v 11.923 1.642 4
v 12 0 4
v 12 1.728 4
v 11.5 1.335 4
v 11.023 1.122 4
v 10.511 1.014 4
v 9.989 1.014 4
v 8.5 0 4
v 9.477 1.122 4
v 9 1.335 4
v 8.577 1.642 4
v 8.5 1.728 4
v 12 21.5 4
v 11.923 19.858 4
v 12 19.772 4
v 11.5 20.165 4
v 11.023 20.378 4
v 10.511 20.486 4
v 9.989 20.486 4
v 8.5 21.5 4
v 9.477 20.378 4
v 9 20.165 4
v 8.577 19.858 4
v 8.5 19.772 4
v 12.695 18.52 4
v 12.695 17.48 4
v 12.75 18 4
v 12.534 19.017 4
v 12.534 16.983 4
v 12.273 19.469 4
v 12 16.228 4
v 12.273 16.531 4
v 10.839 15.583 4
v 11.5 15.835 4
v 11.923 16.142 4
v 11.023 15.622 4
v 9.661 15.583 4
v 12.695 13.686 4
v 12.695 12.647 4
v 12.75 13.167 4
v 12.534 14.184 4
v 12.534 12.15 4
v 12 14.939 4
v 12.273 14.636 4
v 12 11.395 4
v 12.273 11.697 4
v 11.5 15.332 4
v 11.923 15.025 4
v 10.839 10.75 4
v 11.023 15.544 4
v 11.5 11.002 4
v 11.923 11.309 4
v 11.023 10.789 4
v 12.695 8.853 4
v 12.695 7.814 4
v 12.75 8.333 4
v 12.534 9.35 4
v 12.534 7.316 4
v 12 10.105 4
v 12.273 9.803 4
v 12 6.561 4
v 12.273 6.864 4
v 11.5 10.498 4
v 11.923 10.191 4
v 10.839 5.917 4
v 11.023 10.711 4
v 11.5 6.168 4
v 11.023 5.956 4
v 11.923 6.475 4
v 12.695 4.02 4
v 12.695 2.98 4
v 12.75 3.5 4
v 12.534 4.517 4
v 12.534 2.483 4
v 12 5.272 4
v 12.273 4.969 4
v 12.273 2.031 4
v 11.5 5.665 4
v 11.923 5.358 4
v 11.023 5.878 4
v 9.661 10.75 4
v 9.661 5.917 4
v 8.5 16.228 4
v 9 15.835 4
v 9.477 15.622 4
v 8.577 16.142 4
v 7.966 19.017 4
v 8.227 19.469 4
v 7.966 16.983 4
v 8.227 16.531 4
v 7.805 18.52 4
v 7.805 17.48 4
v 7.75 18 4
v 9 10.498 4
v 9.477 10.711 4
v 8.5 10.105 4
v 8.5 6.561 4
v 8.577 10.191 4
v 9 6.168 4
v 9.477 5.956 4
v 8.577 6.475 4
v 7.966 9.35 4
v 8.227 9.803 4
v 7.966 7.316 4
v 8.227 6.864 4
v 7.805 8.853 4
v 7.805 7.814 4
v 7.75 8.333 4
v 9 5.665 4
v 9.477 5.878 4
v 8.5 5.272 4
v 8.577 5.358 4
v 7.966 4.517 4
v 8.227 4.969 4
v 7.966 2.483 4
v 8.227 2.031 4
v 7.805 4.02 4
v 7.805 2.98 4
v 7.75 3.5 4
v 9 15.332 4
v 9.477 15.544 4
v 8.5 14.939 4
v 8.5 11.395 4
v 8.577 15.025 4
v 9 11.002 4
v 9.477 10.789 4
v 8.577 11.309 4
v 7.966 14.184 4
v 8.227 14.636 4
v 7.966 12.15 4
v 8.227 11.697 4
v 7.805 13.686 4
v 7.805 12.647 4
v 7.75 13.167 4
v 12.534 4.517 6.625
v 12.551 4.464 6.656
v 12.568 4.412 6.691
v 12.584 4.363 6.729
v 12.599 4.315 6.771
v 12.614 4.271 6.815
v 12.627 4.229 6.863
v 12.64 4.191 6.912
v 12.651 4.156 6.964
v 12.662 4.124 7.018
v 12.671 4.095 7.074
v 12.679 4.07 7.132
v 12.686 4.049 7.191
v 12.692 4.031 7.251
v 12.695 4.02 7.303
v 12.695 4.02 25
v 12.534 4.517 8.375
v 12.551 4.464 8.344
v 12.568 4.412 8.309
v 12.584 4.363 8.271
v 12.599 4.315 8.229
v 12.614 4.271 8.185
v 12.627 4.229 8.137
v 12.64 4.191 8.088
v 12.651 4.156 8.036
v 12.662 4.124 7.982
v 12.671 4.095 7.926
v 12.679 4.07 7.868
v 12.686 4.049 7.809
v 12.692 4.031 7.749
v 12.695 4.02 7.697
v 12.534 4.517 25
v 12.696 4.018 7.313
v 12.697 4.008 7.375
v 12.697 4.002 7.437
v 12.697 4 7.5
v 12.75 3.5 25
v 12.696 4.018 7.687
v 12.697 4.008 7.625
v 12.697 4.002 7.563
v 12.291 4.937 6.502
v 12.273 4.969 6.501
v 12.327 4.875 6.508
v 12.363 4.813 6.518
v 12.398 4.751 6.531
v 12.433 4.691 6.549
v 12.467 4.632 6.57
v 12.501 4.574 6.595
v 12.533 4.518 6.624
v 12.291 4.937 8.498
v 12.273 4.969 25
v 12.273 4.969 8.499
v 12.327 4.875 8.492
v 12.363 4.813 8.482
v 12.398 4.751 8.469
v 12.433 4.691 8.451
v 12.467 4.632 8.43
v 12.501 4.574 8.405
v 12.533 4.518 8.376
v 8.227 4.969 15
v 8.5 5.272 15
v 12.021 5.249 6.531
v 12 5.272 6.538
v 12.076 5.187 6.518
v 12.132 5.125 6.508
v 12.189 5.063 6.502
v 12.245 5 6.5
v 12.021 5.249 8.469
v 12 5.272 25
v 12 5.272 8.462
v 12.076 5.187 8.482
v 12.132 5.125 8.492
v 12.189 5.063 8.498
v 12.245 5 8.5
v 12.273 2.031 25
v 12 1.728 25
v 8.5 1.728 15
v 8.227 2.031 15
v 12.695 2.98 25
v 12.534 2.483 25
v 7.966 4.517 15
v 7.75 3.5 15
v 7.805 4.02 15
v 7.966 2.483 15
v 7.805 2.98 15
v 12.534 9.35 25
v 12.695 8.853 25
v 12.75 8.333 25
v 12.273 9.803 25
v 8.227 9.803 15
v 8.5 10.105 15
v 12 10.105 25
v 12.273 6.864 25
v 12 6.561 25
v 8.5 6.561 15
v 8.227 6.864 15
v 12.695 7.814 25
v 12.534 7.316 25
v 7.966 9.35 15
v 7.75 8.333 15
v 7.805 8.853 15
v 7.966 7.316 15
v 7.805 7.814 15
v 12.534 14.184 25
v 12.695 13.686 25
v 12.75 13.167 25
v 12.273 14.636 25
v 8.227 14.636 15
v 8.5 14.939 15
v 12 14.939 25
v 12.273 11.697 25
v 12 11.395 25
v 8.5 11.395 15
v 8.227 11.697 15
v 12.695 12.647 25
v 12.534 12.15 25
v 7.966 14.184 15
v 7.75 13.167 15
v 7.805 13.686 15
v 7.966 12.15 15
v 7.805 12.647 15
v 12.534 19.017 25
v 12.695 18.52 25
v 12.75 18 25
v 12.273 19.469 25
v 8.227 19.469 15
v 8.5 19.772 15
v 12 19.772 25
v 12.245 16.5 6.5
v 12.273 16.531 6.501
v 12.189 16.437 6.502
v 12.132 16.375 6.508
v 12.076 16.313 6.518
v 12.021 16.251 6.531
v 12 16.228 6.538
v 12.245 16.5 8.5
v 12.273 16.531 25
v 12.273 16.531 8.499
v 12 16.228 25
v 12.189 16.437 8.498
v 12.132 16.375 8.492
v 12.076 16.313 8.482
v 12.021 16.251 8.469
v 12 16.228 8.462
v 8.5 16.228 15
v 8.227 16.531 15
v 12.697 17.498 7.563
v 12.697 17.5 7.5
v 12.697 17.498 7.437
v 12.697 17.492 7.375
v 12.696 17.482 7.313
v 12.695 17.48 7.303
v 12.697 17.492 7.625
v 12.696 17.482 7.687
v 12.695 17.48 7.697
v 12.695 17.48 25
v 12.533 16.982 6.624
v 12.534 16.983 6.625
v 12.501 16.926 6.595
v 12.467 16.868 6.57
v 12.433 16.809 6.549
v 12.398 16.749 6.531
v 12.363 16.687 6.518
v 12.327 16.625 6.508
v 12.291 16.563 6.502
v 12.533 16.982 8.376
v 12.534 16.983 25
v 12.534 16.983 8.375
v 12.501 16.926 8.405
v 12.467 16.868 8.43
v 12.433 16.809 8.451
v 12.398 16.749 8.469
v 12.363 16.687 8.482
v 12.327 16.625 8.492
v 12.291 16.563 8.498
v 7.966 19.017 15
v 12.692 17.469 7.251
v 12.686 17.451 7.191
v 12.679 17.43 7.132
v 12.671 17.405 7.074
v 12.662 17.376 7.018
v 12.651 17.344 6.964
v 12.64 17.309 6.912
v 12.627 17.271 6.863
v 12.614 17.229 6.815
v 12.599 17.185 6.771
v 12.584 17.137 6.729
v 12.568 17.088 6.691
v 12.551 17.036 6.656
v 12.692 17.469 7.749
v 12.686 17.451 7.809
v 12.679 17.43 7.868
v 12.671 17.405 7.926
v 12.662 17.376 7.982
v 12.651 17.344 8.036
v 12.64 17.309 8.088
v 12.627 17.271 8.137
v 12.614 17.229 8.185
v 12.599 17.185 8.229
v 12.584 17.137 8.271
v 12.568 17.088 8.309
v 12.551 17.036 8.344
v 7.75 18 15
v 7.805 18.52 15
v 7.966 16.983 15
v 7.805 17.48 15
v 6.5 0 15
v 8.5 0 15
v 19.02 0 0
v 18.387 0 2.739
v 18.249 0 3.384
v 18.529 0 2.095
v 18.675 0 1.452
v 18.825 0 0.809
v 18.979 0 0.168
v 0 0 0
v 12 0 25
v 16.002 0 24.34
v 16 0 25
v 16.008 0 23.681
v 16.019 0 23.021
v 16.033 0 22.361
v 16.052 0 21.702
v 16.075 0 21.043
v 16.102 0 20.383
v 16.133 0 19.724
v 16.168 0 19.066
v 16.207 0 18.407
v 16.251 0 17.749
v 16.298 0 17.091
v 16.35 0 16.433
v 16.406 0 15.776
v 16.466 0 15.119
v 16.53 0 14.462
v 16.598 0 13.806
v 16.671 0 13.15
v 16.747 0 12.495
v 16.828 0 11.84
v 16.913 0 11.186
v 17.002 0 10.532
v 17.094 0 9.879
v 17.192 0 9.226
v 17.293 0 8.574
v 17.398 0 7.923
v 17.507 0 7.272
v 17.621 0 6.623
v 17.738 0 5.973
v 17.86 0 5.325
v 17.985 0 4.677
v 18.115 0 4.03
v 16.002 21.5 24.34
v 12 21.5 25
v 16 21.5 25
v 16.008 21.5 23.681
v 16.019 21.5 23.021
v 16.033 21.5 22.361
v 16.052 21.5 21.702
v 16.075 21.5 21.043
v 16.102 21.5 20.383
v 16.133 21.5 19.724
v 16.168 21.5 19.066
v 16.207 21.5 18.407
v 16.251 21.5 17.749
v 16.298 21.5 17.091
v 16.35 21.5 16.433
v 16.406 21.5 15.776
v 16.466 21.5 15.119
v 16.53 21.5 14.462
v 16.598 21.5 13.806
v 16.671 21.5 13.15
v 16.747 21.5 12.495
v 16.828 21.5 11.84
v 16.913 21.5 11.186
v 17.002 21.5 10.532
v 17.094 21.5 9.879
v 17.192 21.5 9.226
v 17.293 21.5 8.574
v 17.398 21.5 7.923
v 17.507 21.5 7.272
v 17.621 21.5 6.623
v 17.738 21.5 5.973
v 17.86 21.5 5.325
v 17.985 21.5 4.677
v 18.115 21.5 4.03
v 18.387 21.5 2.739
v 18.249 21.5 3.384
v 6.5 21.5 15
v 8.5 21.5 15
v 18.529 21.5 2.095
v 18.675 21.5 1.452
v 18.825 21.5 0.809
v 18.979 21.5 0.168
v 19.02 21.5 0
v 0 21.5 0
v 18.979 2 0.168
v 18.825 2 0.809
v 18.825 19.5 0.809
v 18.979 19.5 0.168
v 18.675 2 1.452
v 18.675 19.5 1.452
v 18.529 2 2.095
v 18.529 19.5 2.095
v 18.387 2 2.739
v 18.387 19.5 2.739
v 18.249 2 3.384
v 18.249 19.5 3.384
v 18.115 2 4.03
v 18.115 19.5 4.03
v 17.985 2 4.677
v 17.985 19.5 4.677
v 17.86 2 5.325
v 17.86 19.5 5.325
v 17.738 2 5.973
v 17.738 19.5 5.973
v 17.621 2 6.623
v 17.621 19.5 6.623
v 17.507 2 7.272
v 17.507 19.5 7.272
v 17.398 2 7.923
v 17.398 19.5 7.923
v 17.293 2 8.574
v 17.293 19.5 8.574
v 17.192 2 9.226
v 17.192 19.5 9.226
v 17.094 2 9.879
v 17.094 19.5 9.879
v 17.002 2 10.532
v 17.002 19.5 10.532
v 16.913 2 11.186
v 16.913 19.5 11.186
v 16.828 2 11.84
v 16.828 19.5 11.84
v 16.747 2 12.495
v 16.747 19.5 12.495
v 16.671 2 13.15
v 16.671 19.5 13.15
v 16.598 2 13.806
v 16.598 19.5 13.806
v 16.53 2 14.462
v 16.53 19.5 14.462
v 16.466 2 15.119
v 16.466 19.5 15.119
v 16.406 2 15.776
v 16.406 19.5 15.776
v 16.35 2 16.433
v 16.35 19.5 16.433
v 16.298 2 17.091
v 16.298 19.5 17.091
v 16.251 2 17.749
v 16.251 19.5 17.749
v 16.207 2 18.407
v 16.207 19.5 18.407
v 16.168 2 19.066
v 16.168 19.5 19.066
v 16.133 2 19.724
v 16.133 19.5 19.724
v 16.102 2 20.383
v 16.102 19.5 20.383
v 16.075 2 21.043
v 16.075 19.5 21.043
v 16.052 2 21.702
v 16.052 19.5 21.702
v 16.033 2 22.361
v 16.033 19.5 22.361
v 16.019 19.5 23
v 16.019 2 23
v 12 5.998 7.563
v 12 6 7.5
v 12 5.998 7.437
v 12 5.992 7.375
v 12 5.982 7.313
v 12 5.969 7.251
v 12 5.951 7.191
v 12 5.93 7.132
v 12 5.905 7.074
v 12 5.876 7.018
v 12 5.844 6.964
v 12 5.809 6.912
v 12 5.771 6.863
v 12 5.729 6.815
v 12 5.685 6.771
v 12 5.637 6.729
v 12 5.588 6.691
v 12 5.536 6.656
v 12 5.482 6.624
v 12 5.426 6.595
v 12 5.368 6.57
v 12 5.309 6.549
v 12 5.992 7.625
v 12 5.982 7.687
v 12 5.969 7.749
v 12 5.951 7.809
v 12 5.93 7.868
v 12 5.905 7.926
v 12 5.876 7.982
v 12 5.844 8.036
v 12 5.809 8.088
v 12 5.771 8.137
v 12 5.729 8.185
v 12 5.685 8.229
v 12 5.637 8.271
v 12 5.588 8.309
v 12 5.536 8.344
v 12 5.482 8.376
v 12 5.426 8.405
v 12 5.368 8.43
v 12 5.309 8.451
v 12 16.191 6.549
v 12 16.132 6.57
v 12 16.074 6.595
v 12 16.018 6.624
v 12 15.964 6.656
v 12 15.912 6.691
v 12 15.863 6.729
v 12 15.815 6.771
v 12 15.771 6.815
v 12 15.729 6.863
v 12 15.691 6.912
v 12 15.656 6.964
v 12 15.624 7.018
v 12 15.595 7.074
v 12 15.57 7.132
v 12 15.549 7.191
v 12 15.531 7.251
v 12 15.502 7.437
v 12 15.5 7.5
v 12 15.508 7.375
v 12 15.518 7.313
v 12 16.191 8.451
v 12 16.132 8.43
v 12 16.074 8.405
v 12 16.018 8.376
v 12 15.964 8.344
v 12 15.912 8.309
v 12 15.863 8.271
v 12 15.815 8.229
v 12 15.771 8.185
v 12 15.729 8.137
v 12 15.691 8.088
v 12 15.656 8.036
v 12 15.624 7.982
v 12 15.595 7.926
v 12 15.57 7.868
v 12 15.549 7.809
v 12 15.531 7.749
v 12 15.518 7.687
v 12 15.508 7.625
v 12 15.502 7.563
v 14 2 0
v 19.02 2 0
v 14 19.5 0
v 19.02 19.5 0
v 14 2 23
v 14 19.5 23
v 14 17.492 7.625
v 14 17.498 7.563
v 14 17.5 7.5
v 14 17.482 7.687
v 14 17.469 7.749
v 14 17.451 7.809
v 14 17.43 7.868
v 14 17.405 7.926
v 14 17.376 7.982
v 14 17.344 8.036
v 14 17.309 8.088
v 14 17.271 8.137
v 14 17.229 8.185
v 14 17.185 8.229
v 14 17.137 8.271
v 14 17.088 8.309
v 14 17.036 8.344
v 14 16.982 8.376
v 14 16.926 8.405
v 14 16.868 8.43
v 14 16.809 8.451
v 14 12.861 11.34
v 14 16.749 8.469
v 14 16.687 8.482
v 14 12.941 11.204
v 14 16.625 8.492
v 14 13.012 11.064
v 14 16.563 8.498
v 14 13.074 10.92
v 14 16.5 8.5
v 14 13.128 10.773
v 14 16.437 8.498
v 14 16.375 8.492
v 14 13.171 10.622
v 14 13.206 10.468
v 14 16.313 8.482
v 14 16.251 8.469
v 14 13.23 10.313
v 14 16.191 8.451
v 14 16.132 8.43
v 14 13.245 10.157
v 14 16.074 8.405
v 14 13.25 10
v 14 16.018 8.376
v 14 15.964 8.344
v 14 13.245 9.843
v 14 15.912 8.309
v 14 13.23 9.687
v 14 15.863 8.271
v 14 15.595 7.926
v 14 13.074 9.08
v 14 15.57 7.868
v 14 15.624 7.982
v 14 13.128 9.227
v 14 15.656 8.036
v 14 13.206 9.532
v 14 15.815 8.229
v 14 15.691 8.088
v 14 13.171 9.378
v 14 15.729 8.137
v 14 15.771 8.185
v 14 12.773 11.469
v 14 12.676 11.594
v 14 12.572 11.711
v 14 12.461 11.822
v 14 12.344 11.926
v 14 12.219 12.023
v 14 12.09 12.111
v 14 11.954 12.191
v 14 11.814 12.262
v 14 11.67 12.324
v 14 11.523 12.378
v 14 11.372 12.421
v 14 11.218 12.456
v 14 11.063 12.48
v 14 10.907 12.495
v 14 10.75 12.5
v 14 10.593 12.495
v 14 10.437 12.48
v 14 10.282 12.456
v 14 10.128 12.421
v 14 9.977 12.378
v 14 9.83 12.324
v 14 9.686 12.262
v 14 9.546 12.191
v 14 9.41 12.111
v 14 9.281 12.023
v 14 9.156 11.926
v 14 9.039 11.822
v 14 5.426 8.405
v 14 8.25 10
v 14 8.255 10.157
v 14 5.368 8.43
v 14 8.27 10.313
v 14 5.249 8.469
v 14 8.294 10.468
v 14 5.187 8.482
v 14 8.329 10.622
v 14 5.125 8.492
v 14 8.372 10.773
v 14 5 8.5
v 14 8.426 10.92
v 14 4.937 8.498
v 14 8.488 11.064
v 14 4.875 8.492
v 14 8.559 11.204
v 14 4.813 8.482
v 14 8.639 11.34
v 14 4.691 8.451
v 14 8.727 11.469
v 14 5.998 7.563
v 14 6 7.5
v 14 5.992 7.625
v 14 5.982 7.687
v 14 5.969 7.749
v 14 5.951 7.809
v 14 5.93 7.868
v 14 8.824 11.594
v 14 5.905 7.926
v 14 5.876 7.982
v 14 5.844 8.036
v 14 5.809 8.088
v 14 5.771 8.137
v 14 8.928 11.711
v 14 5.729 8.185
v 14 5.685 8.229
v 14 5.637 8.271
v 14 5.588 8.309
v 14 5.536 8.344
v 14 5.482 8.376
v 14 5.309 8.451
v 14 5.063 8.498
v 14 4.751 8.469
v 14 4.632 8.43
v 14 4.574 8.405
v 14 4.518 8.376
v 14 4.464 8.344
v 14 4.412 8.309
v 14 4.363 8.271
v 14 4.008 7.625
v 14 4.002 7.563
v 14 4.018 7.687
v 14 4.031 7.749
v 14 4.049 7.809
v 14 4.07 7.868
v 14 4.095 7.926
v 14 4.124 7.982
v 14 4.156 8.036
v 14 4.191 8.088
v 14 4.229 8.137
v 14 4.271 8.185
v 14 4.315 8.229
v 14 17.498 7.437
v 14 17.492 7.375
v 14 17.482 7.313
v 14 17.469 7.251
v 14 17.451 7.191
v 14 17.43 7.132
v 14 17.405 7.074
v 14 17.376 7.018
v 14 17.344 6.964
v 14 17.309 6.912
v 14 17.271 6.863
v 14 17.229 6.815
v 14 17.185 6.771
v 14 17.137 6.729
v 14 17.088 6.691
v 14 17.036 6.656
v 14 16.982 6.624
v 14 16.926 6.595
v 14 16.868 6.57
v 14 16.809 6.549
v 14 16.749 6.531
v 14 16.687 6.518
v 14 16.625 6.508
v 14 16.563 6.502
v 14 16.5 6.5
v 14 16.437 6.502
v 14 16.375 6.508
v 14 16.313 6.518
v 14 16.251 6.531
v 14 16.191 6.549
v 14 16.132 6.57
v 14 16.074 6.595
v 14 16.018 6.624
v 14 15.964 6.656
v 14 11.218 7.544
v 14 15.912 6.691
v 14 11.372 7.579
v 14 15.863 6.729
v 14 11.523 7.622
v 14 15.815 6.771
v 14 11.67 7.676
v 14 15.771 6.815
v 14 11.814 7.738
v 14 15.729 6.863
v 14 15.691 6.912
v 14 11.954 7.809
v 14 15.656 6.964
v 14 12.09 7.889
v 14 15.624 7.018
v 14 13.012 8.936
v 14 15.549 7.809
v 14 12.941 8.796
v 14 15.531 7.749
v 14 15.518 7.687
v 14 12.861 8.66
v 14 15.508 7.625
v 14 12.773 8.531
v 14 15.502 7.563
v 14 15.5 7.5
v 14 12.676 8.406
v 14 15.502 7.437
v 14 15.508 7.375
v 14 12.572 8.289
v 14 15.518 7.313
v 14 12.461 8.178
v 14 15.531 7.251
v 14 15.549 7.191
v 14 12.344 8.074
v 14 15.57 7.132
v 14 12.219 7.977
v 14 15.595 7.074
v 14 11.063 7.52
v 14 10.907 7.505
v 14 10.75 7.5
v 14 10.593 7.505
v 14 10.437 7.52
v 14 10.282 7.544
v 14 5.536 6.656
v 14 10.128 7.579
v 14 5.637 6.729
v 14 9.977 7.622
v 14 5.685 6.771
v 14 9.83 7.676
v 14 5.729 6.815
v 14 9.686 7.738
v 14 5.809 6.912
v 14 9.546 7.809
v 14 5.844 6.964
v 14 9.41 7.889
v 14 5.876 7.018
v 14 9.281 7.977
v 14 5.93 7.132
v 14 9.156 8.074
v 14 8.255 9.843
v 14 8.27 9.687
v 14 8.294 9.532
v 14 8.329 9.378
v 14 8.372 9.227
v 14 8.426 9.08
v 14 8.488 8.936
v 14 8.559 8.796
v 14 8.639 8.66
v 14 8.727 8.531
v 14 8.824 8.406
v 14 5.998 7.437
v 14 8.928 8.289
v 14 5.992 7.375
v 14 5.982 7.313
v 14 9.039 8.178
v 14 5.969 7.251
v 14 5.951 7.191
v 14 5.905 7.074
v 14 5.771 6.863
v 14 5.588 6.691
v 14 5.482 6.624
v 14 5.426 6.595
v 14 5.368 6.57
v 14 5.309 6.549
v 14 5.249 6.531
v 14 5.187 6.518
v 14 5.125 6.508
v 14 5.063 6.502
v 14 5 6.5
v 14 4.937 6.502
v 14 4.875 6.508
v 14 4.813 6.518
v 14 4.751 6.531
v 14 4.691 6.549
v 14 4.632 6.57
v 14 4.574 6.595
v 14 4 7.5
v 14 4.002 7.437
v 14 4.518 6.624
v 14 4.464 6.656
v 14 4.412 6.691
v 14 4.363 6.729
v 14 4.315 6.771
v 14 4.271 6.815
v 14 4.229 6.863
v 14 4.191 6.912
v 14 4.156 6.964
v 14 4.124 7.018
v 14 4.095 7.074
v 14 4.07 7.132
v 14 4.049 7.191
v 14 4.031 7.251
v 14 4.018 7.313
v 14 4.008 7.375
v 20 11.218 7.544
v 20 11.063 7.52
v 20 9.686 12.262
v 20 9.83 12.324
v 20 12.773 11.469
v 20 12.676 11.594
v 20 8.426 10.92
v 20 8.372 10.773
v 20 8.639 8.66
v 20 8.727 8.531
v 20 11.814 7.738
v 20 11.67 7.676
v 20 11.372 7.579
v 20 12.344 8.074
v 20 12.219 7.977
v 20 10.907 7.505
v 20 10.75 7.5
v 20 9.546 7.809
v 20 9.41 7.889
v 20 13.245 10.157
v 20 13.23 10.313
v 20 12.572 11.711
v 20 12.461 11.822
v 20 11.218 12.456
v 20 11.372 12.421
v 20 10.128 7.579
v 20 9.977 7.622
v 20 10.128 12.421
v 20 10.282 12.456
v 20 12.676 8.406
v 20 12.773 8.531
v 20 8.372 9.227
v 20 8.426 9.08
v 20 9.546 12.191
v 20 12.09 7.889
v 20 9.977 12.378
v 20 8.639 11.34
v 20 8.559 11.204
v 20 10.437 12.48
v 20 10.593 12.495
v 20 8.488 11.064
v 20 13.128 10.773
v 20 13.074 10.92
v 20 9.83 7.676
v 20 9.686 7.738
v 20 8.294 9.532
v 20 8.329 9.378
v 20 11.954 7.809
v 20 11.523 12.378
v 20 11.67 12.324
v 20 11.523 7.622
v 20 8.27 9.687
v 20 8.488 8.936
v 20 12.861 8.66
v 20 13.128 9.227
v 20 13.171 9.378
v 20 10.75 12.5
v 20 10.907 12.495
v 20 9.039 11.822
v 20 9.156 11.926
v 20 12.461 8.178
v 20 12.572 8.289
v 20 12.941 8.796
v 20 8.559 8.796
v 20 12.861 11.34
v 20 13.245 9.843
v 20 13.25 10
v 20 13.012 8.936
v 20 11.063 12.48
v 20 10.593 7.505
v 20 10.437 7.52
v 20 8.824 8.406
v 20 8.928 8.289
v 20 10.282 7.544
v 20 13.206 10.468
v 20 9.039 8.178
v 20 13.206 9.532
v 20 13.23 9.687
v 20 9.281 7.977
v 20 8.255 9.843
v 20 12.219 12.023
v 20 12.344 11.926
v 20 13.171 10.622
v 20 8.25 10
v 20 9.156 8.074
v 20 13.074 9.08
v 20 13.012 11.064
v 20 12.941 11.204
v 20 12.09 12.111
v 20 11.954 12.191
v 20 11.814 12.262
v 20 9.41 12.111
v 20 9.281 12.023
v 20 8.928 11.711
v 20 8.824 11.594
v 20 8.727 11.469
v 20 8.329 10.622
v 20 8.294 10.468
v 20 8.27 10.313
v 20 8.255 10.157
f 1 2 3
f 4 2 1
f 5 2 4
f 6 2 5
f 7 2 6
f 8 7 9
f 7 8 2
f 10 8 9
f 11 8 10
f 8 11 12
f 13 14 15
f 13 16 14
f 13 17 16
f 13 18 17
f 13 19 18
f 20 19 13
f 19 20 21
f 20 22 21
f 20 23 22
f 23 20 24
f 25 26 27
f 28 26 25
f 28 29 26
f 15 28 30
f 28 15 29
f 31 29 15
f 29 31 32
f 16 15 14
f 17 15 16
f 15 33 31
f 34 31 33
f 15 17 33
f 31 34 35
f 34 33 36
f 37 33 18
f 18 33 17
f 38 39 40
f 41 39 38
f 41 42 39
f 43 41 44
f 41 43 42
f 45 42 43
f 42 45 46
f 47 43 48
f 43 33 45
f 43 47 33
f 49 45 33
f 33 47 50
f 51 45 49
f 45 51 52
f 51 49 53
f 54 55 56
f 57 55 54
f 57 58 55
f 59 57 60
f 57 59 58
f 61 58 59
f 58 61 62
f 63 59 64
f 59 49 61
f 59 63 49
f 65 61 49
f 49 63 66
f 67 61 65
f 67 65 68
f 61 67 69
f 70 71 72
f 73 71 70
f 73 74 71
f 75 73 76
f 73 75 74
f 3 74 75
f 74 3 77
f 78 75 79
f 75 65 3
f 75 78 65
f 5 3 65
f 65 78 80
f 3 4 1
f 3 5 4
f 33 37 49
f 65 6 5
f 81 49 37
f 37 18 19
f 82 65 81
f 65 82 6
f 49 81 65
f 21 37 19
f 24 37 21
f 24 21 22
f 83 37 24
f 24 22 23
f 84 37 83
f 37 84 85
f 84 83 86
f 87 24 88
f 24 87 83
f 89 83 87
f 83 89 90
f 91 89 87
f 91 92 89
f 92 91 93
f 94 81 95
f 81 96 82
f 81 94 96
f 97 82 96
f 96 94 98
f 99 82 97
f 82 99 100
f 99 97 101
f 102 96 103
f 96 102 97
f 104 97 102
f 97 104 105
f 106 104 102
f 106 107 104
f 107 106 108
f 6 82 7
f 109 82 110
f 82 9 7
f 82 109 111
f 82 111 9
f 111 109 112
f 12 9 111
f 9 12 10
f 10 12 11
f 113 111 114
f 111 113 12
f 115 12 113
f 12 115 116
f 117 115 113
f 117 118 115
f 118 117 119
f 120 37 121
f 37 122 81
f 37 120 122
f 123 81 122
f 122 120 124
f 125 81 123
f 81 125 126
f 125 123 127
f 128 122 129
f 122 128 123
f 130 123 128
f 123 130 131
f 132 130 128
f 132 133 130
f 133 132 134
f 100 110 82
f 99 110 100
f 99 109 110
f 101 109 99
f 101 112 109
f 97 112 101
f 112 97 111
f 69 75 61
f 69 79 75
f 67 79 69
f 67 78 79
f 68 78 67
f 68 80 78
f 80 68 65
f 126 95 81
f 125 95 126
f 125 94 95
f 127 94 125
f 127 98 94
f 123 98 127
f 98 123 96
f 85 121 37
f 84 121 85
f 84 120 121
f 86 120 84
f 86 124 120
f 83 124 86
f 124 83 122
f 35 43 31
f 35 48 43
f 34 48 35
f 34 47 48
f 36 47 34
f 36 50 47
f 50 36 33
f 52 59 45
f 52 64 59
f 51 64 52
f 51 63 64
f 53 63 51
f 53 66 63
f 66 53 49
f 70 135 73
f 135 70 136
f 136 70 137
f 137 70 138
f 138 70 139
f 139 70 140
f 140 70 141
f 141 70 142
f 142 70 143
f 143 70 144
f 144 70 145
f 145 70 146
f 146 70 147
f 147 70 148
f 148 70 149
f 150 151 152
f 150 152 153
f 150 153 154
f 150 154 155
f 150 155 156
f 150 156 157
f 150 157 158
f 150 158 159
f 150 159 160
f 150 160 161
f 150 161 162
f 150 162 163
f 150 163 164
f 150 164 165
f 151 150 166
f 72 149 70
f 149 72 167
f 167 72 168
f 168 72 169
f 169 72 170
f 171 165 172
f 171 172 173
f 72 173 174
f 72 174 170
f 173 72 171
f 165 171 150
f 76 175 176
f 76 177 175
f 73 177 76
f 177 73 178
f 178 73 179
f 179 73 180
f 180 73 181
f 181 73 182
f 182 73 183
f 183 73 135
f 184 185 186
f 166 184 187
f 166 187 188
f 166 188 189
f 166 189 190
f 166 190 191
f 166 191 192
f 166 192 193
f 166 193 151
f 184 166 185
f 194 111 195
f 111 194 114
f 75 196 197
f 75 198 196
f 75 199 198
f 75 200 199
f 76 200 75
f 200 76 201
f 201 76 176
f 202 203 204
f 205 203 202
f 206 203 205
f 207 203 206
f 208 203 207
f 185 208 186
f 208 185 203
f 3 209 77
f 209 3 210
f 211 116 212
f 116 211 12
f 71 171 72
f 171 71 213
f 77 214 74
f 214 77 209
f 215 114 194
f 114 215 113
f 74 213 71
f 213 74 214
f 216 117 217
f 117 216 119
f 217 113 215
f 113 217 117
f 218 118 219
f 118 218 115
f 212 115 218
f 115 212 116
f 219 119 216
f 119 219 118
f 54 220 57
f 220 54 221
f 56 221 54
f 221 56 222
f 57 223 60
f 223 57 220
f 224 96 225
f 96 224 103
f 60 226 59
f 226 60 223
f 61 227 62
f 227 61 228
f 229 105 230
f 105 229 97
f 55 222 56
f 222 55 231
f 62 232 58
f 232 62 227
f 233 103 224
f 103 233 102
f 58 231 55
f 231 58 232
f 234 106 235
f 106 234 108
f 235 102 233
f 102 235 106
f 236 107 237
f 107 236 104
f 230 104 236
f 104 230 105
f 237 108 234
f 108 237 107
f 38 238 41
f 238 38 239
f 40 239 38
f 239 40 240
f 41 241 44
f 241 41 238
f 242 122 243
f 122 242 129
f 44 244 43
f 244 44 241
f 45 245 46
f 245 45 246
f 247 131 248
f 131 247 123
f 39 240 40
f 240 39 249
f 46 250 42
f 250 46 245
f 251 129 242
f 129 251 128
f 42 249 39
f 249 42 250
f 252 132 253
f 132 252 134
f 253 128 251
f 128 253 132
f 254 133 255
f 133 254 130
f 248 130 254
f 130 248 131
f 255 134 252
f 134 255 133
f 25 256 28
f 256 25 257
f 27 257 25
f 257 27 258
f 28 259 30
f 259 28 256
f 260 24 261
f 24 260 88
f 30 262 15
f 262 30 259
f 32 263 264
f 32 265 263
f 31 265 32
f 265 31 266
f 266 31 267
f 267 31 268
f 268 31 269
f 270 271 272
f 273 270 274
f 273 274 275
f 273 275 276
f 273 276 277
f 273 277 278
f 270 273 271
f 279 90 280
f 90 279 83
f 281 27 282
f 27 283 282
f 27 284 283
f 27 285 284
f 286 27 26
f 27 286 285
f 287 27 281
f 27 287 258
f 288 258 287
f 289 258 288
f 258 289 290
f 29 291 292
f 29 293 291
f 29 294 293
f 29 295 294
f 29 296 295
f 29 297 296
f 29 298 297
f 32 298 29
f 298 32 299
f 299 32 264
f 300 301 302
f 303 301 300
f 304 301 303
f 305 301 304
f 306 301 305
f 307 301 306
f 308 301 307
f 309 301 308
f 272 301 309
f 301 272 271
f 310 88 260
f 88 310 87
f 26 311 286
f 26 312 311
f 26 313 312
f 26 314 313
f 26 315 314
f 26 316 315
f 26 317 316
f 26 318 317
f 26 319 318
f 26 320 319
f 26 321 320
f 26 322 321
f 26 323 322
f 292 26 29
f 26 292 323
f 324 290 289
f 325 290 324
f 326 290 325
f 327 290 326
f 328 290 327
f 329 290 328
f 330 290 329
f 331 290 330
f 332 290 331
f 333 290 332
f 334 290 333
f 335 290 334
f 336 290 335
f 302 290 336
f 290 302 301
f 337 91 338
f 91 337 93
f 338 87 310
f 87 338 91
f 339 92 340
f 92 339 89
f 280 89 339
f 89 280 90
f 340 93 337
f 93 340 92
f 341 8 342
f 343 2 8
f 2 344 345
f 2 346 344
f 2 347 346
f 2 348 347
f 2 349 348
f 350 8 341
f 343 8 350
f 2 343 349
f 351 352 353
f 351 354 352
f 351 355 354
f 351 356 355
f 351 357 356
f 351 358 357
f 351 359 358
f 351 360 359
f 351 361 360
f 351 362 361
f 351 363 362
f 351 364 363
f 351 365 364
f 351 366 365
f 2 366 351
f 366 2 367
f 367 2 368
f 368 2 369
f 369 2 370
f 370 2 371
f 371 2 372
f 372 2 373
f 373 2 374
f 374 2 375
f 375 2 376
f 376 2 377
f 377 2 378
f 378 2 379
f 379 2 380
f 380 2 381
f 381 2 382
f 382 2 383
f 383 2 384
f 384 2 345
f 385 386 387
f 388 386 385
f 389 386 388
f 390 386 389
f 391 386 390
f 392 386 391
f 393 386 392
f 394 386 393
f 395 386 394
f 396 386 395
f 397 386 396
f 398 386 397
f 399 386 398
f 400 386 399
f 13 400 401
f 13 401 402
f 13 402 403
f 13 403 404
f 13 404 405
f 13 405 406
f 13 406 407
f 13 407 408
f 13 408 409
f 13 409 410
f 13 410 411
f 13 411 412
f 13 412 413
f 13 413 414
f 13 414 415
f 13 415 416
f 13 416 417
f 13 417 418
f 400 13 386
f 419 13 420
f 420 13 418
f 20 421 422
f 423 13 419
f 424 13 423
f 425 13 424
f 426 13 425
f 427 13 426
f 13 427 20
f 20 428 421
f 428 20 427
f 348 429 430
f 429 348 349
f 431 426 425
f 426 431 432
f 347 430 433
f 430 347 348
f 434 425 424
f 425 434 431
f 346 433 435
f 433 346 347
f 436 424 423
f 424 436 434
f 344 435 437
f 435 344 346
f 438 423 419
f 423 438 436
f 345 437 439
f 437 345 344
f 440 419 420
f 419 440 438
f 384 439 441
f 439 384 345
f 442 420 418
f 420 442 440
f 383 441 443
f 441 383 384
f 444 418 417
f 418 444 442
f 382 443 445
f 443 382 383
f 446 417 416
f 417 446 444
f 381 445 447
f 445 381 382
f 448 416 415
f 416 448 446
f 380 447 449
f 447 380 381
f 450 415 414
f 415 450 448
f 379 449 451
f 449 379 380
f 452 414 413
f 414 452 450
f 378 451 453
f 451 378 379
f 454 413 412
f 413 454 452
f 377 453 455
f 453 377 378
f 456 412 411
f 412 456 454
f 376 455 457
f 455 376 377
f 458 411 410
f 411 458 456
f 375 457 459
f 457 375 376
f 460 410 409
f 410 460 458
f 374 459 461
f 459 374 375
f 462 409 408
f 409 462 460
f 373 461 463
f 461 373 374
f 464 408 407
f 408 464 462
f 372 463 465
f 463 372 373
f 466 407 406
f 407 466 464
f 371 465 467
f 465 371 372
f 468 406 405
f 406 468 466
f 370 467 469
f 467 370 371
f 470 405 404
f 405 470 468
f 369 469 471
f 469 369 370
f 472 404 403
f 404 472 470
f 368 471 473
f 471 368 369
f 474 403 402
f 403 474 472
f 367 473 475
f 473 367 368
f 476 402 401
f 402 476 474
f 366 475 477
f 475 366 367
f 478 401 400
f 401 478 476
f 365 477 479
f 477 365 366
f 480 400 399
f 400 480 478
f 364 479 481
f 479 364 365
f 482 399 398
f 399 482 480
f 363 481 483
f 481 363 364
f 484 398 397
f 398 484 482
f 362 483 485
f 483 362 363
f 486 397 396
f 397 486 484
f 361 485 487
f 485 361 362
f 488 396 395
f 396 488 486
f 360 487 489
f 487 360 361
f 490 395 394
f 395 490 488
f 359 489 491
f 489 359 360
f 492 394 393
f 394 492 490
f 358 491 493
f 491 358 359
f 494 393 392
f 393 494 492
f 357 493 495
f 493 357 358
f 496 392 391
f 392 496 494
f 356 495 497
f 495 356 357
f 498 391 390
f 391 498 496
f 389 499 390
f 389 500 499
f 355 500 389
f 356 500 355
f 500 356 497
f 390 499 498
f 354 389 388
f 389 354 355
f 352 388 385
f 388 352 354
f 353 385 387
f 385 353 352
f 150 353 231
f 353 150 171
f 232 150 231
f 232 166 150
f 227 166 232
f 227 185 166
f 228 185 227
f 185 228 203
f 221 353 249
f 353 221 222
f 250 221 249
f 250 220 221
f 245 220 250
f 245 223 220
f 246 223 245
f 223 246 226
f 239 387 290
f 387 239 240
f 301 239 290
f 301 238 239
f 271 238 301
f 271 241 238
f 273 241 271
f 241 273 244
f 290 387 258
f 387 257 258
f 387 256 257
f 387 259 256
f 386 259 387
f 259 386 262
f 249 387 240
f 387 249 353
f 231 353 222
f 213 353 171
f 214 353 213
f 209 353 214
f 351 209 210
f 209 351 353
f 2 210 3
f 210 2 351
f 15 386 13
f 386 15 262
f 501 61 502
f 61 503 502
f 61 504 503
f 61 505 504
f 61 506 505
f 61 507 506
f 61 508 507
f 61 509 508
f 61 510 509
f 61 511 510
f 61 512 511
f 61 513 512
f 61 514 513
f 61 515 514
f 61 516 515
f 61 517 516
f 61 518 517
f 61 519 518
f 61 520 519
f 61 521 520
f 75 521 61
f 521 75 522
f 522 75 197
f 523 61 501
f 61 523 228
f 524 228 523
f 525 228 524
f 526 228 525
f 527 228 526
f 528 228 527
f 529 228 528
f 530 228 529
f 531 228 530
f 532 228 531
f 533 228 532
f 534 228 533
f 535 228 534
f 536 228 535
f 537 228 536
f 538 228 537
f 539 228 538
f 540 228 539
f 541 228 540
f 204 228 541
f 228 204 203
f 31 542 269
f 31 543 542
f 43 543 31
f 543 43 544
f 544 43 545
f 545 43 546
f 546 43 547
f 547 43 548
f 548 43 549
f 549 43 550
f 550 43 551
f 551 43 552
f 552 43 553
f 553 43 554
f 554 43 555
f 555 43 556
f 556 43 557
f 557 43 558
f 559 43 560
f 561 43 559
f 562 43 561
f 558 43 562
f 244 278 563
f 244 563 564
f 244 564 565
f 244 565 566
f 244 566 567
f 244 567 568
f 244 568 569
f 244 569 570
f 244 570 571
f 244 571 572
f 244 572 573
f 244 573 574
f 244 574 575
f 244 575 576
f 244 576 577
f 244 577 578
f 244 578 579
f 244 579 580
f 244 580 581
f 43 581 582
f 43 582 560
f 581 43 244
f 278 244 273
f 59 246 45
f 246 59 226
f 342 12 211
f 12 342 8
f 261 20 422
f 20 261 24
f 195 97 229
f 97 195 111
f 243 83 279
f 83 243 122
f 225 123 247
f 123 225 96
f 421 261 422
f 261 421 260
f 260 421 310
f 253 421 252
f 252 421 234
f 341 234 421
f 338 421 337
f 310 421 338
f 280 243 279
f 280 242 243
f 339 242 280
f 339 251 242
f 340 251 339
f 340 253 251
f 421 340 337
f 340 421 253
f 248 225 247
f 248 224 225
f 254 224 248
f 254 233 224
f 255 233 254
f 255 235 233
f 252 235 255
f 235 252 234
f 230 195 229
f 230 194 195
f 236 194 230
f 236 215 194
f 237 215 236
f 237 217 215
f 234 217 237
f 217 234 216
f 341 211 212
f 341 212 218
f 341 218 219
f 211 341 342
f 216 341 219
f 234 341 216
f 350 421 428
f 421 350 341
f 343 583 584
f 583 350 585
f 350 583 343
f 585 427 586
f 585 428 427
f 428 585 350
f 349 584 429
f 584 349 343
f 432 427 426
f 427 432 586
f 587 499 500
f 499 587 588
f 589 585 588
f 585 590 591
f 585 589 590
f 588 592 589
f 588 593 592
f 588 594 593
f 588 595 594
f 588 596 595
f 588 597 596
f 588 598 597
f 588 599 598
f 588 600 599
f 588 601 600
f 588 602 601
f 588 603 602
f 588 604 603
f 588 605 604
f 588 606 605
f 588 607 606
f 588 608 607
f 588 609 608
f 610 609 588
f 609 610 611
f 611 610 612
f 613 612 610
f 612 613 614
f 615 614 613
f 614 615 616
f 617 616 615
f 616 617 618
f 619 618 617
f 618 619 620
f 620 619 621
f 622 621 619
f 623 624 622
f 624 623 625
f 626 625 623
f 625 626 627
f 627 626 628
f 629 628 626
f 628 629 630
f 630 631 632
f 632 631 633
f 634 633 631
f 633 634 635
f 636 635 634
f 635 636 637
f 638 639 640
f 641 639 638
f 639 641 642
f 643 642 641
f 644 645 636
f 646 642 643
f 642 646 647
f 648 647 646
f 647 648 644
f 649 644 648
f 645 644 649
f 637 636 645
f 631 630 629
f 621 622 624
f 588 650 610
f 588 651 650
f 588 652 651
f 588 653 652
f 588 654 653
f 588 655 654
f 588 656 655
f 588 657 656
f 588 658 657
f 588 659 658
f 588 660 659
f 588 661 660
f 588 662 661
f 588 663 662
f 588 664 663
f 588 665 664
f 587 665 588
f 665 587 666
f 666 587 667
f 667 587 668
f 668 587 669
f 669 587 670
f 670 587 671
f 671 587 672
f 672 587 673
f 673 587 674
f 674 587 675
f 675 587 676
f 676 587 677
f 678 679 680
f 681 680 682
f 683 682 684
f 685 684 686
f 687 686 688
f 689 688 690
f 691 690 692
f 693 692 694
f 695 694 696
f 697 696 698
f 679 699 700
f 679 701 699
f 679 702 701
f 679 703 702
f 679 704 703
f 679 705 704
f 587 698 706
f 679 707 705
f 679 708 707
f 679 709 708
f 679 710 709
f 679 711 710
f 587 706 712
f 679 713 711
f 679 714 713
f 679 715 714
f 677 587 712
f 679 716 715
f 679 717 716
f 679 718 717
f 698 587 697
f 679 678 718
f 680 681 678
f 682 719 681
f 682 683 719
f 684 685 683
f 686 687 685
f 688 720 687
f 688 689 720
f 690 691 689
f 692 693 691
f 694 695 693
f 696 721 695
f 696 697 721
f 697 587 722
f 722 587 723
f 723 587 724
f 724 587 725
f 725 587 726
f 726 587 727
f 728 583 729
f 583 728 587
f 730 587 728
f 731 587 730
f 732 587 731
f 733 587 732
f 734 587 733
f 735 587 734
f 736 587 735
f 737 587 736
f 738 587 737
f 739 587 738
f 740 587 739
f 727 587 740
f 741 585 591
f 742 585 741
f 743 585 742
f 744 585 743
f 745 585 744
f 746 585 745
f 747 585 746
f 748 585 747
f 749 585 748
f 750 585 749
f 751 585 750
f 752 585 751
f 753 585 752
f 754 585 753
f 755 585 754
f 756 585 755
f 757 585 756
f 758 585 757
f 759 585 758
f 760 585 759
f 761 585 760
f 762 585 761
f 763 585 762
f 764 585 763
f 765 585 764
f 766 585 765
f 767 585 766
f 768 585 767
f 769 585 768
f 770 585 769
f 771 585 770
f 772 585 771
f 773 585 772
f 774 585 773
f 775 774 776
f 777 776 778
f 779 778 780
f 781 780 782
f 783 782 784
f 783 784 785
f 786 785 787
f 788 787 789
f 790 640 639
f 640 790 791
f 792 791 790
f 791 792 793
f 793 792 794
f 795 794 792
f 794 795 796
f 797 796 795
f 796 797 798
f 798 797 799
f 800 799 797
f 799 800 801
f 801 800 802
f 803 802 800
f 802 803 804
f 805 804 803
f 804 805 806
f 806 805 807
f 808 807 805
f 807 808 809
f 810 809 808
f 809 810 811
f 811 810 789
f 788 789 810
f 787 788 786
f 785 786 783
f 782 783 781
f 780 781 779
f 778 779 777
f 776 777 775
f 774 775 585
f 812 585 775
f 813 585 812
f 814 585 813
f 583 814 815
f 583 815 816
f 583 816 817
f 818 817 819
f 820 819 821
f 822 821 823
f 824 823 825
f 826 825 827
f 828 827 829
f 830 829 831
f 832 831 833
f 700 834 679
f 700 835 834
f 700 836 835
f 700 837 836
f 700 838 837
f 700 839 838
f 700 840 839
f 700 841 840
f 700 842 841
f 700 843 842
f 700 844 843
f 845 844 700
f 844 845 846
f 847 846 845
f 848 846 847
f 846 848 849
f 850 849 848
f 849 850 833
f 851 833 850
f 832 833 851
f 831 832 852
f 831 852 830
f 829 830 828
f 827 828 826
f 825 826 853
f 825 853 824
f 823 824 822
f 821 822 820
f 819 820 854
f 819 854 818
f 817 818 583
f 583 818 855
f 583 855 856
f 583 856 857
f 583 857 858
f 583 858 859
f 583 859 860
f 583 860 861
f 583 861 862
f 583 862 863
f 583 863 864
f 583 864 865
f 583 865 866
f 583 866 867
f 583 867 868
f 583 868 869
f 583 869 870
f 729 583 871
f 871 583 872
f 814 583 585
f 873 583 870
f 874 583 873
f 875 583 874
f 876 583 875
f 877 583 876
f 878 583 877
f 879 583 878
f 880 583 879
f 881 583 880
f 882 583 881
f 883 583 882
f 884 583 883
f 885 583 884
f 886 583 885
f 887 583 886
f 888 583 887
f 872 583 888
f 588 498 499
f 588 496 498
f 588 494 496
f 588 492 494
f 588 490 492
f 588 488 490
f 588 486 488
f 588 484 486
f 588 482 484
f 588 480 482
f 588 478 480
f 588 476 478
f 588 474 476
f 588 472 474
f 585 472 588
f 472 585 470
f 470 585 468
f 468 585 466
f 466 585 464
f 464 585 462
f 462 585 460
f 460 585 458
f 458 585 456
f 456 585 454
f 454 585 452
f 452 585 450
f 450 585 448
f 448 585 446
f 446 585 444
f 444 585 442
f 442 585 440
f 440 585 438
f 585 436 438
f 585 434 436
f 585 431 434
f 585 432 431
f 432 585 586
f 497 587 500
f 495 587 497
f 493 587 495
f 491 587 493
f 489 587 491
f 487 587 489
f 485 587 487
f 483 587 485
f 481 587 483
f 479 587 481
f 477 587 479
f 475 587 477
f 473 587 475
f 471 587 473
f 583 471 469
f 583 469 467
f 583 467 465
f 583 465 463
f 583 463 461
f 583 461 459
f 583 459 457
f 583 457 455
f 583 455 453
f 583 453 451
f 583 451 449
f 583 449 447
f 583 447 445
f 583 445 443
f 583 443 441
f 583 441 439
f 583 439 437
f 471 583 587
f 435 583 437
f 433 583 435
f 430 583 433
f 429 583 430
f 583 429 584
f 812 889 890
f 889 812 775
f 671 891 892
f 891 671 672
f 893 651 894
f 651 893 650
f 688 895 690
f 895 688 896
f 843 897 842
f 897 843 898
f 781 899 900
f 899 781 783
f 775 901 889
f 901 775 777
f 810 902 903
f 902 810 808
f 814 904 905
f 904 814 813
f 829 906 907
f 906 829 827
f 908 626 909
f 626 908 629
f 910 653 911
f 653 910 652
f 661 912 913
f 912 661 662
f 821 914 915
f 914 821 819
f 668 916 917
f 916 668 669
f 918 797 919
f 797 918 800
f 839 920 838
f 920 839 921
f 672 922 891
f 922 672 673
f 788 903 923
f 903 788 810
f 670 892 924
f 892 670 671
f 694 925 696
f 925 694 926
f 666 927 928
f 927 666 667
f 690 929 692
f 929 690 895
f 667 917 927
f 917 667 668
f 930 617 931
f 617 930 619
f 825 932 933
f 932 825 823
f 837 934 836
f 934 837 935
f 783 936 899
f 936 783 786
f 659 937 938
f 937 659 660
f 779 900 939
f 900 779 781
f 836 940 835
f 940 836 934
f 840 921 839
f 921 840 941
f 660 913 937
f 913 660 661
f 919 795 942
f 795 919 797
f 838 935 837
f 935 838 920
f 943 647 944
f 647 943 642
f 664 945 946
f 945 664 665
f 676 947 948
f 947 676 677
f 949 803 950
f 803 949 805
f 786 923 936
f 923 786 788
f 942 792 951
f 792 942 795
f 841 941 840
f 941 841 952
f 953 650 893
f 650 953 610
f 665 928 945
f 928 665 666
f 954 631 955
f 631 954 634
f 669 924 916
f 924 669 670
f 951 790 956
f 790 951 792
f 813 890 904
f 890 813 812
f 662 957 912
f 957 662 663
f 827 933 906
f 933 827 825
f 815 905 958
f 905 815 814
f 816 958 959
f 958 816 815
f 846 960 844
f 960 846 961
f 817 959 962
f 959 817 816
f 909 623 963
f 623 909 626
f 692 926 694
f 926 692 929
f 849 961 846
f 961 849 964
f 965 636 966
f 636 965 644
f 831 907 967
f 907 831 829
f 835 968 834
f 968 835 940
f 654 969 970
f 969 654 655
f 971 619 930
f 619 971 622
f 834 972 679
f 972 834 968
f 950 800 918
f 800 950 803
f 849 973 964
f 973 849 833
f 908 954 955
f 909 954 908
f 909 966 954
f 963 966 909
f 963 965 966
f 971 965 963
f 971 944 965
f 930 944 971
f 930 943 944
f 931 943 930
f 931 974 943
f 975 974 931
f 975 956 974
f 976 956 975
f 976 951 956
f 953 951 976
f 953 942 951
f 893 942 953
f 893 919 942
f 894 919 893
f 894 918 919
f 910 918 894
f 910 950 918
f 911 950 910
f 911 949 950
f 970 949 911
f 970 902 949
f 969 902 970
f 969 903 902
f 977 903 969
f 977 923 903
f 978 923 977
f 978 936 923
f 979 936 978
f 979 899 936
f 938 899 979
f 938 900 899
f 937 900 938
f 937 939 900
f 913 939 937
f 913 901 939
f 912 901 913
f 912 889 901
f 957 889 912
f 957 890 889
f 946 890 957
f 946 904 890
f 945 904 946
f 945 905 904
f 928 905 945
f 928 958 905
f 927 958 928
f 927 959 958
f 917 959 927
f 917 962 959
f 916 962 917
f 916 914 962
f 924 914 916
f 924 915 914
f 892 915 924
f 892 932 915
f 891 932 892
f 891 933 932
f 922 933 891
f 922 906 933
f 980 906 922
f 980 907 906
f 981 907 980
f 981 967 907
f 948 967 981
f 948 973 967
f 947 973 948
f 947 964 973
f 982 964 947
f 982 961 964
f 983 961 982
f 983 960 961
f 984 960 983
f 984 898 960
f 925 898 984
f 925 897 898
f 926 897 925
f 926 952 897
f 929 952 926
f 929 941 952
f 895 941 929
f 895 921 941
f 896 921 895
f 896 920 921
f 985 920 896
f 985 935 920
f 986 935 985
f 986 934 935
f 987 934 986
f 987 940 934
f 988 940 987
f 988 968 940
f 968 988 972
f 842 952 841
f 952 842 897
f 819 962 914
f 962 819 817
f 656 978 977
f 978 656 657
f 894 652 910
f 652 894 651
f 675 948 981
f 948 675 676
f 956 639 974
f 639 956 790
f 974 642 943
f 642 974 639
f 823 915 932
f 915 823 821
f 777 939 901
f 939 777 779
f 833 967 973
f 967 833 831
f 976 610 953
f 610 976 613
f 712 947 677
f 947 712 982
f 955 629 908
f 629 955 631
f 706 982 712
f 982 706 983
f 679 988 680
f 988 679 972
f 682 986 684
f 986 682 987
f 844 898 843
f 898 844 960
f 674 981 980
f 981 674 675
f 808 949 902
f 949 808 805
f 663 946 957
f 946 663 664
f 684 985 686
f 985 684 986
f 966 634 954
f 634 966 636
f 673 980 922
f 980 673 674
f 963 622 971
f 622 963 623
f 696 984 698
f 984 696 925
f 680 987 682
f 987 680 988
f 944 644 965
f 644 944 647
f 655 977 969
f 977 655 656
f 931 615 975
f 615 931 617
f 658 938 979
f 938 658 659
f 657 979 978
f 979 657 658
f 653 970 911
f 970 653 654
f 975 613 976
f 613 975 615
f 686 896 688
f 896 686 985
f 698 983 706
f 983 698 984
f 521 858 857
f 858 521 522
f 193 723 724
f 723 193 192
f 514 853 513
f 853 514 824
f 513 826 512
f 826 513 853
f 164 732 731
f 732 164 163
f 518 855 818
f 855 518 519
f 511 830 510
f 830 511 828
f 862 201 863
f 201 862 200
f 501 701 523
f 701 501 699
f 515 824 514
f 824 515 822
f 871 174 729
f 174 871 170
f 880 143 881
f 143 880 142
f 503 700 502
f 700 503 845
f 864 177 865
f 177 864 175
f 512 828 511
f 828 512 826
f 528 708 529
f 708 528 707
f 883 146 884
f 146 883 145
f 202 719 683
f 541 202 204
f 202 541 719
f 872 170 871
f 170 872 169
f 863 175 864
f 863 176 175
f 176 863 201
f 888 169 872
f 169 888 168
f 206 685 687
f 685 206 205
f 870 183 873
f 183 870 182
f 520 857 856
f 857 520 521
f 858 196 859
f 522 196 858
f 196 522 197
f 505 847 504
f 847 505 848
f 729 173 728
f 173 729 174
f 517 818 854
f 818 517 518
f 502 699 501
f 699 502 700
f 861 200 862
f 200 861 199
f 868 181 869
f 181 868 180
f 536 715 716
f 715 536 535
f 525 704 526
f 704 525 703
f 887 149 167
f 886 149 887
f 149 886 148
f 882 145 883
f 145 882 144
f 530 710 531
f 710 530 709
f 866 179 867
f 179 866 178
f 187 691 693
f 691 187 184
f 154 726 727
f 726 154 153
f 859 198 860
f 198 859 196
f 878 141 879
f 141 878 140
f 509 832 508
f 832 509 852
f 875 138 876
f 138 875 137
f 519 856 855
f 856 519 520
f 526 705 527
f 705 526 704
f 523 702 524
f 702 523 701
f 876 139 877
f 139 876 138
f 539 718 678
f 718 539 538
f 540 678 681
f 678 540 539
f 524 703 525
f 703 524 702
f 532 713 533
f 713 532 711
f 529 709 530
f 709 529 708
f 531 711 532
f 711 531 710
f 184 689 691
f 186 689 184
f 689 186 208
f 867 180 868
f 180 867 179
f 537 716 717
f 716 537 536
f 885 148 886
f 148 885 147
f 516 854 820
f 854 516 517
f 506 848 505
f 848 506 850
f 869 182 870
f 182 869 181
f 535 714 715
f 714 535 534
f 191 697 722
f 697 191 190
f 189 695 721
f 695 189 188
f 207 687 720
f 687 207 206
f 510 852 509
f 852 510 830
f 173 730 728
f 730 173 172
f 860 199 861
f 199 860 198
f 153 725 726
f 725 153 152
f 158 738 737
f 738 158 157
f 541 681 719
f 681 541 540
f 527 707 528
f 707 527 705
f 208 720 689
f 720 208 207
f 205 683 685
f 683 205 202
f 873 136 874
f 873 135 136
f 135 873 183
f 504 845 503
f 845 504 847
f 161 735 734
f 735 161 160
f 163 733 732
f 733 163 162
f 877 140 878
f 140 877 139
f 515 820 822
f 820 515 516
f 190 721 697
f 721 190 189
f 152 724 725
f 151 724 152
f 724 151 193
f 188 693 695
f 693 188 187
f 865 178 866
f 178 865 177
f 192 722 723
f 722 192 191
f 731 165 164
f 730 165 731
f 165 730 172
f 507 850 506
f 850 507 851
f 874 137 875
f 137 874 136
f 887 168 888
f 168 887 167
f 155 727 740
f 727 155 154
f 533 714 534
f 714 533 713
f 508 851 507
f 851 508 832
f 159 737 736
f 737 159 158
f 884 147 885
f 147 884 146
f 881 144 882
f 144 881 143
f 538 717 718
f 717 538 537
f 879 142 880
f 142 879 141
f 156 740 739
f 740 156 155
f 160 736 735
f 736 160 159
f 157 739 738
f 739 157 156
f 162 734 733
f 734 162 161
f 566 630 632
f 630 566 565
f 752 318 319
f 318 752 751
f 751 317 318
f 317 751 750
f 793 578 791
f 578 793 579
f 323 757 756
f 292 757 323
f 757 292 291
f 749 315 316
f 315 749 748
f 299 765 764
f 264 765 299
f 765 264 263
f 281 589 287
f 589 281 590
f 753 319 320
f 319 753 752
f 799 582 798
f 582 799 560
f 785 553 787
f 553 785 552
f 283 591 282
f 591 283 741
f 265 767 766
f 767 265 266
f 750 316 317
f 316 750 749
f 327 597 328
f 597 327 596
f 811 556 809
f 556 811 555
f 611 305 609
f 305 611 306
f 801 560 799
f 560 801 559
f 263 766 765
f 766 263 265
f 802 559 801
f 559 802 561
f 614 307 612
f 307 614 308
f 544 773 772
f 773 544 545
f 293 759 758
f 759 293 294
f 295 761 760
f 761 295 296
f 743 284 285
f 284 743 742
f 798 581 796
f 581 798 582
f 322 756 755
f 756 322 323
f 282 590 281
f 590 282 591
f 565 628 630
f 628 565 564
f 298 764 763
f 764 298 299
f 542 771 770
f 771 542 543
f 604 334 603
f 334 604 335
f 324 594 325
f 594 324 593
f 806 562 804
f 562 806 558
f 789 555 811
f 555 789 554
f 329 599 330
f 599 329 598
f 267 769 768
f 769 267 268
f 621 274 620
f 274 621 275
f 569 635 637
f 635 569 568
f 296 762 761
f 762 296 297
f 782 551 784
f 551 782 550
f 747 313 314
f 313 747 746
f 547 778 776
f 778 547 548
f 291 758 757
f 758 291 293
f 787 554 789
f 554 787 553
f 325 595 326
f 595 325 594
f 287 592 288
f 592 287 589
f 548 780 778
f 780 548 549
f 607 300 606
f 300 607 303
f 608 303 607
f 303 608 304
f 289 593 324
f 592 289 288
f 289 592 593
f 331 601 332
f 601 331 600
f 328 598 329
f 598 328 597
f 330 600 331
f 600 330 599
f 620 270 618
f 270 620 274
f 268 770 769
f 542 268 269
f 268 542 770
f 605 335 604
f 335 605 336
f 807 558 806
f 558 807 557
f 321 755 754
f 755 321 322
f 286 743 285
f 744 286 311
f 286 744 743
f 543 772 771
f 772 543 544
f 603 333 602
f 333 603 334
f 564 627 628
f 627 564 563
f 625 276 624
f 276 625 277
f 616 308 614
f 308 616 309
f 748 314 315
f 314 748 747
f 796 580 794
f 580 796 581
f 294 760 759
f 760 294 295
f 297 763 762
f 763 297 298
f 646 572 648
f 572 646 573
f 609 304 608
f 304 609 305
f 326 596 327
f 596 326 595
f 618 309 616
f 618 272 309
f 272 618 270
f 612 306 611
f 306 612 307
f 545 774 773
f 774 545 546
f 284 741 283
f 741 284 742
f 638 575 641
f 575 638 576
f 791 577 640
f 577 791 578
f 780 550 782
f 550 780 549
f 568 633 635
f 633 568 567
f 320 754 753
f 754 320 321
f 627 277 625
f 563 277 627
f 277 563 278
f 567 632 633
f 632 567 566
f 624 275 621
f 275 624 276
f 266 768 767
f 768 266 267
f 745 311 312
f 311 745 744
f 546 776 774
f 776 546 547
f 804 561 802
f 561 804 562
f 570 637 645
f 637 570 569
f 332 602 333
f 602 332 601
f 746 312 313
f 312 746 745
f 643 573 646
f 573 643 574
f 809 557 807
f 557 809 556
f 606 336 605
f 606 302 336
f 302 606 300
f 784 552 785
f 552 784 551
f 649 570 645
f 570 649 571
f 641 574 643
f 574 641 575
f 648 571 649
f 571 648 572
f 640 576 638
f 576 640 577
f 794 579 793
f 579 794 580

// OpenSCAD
difference() {
    union() {
        difference() {
            difference() {
                mirror([0,1,0]) {
                    rotate([90, 0, 0]) {
                        linear_extrude(height = 21.5) {
                            // The shorter triangle side (and base)
                            difference() {
                                union() {
                                    square([8.5, 15]);
                                    square([15, 4]);
                                }
                                polygon([[0,0],[6.5,15],[0,15]]);
                            }
                            // The taller, curved side
                            translate([12,0]) {
                                    difference() {
                                    square([8, 25]);
                                    translate([109, 25]) {
                                        circle(105, $fn=1000);
                                    }
                                }
                            }
                        }
                    }
                }
                
                // The groves
                for (i = [0:3]) {
                    translate([10.25,3.5 + (14.5/3)*i, 4]) {
                        cylinder(25, 2.5, 2.5, $fn=30);
                    }
                }
            }
            
            translate([14,2,0]) {
                cube([7, 17.5, 23]);
            }
        }
        
        translate([14, 10.75, 10]) {
            rotate([0, 90, 0]) {
                cylinder(6, 2.5, 2.5, $fn=100);
            }
        }
    }
    
    union() {
        translate([10, 5, 7.5]) {
            rotate([0,90,0]) {
                cylinder(6,1,1, $fn=100);
            }
        }
        translate([10, 16.5, 7.5]) {
            rotate([0,90,0]) {
                cylinder(6,1,1, $fn=100);
            }
        }
    }
}
